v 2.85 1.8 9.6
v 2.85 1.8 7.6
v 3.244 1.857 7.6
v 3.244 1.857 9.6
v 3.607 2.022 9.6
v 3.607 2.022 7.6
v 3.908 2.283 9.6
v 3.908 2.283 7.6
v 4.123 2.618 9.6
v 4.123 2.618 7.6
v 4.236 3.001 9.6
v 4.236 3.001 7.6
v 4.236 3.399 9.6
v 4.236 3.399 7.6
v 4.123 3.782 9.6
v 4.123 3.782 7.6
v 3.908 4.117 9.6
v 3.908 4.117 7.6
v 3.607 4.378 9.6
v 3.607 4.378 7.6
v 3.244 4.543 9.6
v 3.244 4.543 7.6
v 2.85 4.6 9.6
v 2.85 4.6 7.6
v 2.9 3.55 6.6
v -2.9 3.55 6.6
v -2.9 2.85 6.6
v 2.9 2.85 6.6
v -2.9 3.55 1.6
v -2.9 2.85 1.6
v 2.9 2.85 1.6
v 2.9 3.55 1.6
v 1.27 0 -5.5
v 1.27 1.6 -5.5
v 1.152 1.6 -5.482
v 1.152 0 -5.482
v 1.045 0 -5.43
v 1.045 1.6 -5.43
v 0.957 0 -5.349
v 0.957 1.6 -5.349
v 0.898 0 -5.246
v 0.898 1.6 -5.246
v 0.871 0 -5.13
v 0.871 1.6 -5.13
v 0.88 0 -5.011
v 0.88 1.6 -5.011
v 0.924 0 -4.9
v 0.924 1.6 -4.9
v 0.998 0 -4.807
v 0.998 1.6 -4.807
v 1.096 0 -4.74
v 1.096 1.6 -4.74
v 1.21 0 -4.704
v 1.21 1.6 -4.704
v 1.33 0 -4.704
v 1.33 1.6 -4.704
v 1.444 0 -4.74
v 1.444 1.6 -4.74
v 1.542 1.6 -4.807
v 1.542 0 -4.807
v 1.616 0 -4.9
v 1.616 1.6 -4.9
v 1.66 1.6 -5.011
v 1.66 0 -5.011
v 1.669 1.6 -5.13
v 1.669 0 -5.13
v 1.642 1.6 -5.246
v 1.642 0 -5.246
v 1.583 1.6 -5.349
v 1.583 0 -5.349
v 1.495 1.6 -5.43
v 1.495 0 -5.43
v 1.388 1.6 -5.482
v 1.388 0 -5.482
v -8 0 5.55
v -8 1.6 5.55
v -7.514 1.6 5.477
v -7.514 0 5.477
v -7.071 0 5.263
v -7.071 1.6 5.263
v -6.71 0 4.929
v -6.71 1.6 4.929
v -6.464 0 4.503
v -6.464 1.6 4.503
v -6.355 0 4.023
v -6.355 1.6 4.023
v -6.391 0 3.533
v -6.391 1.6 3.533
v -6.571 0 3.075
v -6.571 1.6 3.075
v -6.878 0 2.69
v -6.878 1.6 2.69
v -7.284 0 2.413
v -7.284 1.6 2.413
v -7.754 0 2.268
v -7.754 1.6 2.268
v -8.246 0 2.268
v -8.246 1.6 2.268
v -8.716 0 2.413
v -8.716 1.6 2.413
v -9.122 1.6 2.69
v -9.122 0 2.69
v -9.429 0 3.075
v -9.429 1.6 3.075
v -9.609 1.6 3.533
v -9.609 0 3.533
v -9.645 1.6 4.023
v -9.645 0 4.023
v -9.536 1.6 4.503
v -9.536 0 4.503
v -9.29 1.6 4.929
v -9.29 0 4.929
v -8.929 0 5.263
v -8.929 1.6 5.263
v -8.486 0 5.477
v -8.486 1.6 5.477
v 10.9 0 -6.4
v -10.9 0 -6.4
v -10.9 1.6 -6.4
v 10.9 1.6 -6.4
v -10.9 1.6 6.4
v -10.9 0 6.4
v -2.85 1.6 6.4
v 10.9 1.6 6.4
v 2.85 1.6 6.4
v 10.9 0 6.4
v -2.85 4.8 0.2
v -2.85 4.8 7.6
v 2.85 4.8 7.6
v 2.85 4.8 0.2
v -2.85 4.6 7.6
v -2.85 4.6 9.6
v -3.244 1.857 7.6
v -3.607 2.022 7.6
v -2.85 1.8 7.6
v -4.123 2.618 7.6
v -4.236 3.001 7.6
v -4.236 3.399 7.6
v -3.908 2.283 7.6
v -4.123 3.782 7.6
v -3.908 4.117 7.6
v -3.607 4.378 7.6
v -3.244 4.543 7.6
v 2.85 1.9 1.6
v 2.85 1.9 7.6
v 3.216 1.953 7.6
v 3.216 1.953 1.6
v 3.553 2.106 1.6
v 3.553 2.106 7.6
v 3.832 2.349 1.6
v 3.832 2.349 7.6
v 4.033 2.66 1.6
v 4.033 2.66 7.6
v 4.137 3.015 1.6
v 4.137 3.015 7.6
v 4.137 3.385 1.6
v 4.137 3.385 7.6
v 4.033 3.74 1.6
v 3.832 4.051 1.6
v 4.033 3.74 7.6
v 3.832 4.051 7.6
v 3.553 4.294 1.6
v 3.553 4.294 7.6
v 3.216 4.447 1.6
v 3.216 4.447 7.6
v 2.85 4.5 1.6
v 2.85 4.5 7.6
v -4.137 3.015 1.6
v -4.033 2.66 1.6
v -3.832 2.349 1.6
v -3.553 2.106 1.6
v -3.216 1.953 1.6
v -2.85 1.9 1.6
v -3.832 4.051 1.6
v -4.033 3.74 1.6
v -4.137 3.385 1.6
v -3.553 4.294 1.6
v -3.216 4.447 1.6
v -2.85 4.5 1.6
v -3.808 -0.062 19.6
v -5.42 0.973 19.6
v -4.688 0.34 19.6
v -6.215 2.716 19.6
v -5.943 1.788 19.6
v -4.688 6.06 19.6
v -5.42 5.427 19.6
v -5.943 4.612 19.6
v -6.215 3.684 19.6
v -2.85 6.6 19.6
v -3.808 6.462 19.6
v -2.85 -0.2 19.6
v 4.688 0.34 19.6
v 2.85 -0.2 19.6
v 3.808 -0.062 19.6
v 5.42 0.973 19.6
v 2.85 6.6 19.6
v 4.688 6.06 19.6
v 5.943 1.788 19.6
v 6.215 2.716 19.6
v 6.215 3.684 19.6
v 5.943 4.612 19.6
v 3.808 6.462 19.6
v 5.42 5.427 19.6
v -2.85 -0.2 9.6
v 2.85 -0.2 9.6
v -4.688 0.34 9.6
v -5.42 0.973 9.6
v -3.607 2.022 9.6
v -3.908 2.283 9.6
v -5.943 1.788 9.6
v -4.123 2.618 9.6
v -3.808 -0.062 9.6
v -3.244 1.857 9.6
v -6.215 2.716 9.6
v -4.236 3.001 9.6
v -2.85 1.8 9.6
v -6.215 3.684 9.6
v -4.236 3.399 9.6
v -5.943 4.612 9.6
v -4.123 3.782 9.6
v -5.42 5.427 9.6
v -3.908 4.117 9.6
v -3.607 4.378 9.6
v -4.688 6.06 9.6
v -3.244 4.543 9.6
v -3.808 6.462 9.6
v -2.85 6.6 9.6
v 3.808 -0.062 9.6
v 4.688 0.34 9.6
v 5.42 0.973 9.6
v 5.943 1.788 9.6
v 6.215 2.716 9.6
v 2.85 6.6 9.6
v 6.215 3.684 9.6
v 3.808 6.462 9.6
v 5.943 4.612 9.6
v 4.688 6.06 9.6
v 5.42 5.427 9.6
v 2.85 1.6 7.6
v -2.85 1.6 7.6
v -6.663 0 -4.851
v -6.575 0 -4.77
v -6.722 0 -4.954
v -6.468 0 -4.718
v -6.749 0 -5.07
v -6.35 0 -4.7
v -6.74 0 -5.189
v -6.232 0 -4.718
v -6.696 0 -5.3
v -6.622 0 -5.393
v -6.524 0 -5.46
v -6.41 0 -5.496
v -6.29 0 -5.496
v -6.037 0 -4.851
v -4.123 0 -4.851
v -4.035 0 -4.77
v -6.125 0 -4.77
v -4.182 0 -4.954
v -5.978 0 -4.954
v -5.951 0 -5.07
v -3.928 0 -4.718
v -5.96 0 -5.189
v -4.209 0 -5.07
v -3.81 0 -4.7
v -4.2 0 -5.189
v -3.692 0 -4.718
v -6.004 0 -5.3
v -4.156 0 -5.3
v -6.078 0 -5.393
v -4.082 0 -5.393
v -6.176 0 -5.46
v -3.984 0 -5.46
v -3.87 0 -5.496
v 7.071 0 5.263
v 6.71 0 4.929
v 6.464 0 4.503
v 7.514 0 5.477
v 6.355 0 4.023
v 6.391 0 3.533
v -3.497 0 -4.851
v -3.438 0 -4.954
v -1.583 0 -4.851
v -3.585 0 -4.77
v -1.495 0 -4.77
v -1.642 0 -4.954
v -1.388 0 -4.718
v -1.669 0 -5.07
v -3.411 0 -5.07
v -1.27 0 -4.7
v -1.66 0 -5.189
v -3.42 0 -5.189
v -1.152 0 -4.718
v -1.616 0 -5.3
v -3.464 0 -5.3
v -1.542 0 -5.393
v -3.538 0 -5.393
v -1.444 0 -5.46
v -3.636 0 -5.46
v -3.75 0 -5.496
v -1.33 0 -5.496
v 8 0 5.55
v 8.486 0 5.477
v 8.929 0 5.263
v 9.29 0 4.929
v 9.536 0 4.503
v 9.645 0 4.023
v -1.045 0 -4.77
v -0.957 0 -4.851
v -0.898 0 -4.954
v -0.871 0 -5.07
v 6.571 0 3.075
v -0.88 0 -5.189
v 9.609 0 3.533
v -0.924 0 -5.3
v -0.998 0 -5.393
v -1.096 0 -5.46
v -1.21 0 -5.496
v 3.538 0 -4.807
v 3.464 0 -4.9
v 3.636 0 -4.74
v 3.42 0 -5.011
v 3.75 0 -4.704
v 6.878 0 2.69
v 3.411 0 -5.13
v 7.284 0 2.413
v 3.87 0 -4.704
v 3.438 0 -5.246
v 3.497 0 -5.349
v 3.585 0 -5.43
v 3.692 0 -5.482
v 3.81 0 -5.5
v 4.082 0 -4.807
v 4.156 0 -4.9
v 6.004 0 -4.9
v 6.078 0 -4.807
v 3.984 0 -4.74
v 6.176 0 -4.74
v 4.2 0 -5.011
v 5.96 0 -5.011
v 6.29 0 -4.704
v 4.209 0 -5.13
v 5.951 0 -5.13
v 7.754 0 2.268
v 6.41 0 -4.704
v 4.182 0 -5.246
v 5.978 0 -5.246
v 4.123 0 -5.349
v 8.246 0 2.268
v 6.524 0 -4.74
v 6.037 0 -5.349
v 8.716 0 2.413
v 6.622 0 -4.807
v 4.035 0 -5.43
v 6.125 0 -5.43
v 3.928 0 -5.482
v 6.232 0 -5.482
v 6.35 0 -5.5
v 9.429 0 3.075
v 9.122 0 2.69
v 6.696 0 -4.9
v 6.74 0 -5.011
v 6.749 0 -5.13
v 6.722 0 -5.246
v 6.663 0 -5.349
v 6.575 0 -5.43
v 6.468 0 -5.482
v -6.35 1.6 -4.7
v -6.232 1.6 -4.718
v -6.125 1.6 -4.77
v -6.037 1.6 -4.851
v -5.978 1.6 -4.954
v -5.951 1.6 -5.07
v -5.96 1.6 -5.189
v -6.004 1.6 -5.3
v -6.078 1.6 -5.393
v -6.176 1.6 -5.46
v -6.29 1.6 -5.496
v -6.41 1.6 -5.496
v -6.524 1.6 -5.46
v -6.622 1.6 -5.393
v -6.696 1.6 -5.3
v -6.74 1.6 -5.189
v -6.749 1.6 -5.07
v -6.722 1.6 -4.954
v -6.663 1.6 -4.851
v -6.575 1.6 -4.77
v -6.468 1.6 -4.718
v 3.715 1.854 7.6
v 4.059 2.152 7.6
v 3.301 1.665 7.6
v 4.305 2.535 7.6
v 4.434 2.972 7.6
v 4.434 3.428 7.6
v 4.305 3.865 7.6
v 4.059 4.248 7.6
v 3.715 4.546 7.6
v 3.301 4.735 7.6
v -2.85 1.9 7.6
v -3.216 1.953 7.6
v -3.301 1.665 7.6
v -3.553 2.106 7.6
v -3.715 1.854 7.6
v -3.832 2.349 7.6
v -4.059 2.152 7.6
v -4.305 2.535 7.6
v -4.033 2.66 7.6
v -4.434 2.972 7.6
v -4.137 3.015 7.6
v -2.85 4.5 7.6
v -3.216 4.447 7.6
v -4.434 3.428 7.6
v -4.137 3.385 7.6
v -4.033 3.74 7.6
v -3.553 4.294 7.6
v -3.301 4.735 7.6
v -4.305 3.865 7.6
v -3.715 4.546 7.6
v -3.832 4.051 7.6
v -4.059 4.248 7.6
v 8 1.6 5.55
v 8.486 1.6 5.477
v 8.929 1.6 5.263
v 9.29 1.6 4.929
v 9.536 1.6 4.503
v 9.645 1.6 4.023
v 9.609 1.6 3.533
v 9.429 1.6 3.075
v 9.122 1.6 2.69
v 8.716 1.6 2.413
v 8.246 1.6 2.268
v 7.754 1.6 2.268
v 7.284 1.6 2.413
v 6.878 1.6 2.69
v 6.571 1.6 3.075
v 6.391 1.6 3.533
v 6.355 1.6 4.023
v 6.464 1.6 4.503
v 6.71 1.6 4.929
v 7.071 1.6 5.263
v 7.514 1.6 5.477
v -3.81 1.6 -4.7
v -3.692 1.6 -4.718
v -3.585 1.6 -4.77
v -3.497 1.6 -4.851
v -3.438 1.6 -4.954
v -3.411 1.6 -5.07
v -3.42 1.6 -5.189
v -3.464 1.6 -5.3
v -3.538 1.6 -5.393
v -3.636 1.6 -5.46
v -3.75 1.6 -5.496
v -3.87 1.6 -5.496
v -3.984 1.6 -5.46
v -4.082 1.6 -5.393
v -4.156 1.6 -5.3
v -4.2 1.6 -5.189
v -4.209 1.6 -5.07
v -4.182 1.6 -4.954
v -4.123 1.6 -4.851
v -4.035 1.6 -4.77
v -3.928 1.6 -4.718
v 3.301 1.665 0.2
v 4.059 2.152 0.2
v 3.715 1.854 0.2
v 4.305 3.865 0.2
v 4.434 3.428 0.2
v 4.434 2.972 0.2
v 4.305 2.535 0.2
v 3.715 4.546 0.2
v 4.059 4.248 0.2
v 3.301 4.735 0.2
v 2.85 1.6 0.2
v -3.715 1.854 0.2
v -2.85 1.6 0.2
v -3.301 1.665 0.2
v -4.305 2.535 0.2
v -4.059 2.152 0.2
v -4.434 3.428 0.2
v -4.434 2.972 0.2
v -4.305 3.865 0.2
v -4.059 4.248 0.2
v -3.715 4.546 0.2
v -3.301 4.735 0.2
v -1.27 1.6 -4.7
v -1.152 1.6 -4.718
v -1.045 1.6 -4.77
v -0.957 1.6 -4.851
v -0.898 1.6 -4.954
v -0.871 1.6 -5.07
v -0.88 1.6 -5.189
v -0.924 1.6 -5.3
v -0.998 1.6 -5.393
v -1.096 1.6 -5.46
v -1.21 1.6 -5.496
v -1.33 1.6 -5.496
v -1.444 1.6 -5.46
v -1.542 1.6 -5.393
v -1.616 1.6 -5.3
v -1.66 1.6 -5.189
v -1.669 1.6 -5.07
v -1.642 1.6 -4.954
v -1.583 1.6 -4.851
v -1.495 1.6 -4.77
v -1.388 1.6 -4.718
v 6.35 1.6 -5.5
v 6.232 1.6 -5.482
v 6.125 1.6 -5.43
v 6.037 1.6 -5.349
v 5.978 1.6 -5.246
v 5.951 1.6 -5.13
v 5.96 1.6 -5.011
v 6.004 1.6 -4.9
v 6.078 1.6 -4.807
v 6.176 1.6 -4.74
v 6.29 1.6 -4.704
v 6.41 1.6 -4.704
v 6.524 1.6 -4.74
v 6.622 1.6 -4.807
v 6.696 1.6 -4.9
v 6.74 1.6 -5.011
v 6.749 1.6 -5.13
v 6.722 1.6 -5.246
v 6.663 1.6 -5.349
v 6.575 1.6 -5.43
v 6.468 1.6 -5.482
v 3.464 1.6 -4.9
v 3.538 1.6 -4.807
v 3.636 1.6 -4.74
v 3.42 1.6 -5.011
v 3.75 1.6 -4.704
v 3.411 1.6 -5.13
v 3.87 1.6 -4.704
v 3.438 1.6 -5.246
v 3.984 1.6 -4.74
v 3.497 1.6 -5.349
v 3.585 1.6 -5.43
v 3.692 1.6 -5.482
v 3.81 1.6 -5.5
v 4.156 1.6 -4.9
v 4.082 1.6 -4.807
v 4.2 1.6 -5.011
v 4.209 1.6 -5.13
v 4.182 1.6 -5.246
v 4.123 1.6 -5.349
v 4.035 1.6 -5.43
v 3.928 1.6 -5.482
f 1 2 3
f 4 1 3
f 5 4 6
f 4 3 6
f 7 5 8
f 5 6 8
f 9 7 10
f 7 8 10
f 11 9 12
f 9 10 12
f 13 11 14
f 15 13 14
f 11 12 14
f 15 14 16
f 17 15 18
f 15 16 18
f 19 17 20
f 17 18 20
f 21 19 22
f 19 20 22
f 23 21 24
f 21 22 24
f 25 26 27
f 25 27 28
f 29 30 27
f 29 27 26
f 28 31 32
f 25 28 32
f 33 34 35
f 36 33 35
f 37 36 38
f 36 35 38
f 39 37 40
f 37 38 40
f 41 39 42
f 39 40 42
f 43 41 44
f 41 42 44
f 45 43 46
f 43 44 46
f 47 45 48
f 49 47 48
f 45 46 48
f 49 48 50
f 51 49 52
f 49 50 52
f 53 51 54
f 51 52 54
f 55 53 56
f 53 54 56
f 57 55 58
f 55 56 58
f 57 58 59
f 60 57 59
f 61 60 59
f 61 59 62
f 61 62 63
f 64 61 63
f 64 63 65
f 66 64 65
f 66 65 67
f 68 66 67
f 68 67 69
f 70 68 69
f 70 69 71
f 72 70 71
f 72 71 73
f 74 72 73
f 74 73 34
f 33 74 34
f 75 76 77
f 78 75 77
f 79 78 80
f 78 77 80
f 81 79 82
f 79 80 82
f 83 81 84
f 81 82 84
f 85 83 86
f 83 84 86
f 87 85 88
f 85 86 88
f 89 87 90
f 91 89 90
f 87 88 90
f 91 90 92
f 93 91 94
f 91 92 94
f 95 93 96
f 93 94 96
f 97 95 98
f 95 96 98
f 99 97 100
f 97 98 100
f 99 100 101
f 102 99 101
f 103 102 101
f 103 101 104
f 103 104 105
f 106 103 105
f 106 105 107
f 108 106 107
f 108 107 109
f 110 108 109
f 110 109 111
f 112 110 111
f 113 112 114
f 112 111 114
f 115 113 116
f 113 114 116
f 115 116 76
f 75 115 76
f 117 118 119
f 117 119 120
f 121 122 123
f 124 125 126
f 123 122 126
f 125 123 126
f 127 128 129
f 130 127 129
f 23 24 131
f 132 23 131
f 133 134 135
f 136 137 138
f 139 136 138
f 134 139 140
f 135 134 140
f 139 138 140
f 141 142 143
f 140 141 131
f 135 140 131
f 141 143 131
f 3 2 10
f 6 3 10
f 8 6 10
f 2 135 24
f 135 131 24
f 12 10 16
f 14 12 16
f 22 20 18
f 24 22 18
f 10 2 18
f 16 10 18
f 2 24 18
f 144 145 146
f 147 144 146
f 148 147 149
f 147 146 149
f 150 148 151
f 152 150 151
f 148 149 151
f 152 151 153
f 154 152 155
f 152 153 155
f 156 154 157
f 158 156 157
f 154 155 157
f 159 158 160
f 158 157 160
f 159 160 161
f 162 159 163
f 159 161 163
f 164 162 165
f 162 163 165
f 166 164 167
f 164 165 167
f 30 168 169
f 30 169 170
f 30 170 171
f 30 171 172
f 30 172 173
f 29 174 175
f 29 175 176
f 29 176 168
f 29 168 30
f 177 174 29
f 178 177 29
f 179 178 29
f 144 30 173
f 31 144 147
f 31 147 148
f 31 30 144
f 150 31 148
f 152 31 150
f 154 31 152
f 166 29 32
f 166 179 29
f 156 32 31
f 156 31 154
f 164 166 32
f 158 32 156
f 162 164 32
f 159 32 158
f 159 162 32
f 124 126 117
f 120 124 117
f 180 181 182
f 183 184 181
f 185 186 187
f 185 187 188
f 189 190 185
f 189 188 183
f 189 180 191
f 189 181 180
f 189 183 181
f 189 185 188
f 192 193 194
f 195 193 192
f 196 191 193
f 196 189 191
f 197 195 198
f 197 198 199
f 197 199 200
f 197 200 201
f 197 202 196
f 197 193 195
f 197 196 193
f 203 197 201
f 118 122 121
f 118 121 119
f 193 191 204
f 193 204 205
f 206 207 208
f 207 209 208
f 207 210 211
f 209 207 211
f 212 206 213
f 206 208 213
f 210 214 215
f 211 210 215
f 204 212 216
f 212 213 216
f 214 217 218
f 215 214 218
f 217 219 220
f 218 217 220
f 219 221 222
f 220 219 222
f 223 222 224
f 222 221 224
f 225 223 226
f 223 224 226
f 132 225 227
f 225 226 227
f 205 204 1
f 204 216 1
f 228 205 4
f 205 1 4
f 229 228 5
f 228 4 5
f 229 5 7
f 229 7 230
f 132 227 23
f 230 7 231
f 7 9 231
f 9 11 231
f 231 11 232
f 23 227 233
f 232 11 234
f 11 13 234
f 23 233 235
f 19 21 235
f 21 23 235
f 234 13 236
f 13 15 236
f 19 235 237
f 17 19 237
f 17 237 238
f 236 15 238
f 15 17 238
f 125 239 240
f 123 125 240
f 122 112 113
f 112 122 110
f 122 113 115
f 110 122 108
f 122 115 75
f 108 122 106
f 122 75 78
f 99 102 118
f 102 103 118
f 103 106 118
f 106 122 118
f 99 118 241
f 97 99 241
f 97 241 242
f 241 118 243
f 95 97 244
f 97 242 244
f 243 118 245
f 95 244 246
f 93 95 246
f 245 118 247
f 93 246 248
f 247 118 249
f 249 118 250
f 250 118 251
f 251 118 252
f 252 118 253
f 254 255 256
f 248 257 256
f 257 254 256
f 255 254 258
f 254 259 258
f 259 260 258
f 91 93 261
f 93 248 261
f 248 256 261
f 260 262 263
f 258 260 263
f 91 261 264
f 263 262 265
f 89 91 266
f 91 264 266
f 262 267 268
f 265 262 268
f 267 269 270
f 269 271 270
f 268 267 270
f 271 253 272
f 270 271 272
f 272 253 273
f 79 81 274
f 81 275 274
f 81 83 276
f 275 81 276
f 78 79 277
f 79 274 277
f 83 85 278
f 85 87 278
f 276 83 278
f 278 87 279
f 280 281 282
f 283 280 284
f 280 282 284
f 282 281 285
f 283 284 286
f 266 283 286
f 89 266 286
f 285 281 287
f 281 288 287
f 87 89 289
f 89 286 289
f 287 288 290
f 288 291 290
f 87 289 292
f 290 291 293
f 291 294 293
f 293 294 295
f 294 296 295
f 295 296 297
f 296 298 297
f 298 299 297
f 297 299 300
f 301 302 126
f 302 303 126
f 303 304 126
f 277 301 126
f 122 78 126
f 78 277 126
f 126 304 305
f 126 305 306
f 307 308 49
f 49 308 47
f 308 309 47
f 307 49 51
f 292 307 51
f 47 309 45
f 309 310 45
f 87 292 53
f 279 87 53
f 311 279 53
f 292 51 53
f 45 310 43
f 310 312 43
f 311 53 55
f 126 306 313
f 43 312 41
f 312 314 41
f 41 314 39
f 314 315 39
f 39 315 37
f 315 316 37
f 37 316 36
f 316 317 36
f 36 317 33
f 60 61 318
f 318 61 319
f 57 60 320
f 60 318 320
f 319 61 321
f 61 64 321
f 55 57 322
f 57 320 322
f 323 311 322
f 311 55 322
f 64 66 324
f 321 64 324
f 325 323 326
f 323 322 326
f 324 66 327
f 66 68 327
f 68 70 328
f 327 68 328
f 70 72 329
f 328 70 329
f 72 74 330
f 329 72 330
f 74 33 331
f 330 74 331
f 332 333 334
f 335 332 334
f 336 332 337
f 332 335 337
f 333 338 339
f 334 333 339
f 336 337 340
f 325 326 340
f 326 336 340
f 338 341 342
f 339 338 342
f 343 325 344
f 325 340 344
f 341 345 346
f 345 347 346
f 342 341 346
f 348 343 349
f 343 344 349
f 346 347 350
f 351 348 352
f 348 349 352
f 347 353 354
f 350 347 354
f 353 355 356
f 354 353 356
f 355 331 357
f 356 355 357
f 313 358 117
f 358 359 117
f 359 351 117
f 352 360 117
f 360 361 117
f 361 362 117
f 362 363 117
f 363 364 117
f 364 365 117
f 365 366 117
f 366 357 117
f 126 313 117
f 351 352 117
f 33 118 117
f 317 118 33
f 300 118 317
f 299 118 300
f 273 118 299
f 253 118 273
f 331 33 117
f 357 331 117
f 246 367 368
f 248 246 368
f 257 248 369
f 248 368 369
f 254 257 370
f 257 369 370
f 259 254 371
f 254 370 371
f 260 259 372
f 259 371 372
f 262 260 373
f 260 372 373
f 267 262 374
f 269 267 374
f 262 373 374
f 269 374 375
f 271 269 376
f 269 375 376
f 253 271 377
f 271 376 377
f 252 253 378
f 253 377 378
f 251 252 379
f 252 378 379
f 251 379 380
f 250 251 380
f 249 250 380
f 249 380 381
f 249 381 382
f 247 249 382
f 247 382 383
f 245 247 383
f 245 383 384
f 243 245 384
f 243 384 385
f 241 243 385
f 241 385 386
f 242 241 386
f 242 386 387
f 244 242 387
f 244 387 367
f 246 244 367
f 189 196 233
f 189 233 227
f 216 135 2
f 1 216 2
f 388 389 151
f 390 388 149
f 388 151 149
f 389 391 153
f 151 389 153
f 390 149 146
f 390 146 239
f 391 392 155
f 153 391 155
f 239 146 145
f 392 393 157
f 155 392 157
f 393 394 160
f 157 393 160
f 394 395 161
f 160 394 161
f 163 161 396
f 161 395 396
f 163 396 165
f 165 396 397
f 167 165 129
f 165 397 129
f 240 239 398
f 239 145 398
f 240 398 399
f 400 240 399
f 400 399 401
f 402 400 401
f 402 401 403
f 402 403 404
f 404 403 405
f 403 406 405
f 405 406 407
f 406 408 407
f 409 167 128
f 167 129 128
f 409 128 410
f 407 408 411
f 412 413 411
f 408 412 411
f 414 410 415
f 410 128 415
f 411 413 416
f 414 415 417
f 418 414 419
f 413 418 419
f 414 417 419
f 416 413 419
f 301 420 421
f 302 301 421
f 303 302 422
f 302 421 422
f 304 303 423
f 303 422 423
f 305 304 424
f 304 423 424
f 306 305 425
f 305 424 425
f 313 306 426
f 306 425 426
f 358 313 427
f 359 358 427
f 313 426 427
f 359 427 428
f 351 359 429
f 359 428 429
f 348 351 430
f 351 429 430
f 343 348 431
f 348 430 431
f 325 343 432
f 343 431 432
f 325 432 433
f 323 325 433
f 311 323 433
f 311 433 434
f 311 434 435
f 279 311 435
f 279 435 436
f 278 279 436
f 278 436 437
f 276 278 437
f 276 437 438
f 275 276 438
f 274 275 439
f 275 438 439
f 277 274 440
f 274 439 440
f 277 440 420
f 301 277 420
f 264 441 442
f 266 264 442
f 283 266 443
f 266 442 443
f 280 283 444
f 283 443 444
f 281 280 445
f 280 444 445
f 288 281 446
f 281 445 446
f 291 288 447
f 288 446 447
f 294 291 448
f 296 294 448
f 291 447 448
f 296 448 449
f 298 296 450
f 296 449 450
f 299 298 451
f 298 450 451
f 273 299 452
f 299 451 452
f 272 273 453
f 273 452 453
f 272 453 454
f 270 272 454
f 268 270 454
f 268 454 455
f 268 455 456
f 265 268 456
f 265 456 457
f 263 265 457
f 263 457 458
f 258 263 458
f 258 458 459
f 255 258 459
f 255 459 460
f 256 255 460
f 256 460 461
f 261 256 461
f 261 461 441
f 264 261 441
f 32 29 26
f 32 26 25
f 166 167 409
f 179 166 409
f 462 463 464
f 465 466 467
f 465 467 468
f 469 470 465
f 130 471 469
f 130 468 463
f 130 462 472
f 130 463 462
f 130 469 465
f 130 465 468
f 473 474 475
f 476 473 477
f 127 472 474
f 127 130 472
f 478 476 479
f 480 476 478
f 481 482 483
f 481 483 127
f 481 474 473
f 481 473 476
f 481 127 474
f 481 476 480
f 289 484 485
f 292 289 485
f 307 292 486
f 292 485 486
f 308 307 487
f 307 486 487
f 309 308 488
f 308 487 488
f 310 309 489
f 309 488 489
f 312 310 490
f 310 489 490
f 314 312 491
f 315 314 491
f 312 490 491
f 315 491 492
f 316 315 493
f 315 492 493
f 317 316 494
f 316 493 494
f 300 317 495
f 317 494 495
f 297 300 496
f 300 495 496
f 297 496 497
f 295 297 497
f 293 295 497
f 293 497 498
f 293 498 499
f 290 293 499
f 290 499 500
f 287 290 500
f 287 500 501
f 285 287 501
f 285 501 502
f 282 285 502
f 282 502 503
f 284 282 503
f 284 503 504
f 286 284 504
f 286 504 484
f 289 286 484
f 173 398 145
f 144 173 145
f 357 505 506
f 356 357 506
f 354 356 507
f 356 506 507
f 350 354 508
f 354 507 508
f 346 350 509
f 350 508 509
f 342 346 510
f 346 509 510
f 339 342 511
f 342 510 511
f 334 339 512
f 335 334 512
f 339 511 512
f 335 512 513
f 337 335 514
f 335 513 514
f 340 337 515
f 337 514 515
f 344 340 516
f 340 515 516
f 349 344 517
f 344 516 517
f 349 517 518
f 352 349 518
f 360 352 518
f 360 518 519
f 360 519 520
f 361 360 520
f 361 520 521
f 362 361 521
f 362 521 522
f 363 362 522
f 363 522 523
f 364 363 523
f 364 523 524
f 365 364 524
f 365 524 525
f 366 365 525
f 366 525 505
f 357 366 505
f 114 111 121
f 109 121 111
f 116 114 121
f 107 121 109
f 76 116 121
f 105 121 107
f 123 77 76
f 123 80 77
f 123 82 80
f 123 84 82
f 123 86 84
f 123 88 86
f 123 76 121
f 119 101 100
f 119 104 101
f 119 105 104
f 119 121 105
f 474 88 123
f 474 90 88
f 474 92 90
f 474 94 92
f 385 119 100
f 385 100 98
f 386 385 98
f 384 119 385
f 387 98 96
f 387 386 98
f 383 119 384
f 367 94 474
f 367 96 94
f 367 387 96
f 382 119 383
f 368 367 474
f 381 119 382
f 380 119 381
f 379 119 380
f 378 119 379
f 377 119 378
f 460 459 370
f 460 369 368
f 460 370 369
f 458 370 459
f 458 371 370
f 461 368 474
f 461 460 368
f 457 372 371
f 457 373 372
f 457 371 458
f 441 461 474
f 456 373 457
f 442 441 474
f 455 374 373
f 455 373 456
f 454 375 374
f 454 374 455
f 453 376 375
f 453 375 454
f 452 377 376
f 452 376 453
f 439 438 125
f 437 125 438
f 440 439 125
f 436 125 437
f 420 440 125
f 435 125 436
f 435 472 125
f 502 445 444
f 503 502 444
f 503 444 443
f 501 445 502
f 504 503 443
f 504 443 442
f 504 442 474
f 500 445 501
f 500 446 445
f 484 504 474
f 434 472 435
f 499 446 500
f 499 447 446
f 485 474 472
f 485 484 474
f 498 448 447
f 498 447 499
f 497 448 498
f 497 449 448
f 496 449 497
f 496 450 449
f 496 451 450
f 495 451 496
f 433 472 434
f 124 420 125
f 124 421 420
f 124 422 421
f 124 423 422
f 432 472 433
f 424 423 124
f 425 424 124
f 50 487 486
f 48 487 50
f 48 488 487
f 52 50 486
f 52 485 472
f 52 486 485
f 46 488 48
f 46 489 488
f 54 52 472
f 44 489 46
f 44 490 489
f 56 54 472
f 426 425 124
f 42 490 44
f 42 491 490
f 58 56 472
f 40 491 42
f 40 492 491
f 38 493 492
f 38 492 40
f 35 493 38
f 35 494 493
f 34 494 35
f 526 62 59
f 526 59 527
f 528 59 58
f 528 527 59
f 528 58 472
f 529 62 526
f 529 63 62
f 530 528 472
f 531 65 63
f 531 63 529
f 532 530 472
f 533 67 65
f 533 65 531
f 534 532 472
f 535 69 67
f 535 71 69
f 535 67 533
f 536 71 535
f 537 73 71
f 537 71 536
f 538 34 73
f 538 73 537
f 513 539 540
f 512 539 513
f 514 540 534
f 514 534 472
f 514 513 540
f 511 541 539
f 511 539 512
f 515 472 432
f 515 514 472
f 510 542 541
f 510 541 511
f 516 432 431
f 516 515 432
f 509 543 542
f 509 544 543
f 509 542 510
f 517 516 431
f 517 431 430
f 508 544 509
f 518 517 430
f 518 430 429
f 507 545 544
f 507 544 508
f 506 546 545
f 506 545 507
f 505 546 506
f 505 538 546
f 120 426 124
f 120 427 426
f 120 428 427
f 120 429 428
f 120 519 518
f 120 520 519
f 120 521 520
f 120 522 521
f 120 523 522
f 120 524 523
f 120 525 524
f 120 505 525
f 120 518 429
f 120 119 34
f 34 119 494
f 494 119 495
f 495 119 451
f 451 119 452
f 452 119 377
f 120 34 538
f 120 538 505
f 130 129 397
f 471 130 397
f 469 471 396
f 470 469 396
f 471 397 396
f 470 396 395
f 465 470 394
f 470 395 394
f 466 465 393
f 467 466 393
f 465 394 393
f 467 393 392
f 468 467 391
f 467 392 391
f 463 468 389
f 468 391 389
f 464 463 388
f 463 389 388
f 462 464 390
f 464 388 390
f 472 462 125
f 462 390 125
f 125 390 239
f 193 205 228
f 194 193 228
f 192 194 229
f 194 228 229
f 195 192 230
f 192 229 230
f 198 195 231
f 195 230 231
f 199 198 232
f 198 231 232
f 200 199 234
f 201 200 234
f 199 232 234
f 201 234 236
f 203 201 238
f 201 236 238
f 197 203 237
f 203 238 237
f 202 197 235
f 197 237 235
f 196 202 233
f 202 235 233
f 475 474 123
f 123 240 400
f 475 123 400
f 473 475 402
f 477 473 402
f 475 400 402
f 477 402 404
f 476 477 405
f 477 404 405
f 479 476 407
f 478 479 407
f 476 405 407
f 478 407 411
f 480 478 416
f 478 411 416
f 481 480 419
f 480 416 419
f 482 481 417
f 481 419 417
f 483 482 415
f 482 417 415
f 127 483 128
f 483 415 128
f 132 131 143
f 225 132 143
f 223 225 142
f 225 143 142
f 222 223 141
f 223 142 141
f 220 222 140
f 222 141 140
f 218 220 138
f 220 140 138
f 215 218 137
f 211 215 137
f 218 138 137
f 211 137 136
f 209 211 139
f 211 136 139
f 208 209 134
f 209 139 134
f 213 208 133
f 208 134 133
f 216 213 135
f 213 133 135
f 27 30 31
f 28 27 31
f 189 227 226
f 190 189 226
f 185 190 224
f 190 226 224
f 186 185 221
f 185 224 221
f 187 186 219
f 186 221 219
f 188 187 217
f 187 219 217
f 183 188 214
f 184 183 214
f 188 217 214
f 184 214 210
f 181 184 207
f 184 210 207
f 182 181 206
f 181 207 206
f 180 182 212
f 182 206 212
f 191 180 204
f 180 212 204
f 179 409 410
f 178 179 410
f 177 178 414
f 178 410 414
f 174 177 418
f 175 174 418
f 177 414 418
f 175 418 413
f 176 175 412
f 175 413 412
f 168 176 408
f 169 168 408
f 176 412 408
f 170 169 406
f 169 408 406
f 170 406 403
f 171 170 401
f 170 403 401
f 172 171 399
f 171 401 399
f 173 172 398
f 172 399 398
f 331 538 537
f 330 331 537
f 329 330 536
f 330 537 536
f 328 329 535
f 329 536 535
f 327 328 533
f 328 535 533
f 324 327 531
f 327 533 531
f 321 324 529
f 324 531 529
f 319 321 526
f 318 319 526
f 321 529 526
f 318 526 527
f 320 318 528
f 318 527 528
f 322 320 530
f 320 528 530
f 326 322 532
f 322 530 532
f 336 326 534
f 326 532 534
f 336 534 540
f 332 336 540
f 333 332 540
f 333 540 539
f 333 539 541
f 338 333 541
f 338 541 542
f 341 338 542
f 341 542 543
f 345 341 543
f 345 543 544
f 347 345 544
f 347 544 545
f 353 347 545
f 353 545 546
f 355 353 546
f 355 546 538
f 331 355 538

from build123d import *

# Parameters (mm, degrees)
SKETCH1_W           = 21.8
SKETCH1_H           = 12.8
BOSS_EXTRUDE1_DEPTH = 1.6
SKETCH2_R           = 1.65
CUT_EXTRUDE1_DEPTH  = 1.6
BOSS_EXTRUDE2_DEPTH = 7.4
BOSS_EXTRUDE3_DEPTH = 2
BOSS_EXTRUDE4_DEPTH = 10
CUT_EXTRUDE2_DEPTH  = 6
SKETCH7_W           = 5.8
SKETCH7_H           = 0.7
BOSS_EXTRUDE5_DEPTH = 5
SKETCH8_R           = 0.4
CUT_EXTRUDE3_DEPTH  = 23.977597786


# Read off the part's stored shape, not the designer's step: Split1
with BuildPart() as part:
    # Sketch1 → Boss-Extrude1 (new body)
    with BuildSketch(Plane(origin=(0, 0, 0), x_dir=(1, 0, 0), z_dir=(0, 1, 0))):
        Rectangle(SKETCH1_W, SKETCH1_H)
    extrude(amount=BOSS_EXTRUDE1_DEPTH)

    # Sketch2 → Cut-Extrude1 (cut)
    with BuildSketch(Plane(origin=(0, 1.6, 0), x_dir=(1, 0, 0), z_dir=(0, 1, 0))):
        with Locations(Location((-8, -3.9, 0), (0, 0, 270))):
            Circle(SKETCH2_R)
        with Locations(Location((8, -3.9, 0), (0, 0, 270))):
            Circle(SKETCH2_R)
    extrude(amount=-CUT_EXTRUDE1_DEPTH, mode=Mode.SUBTRACT)

    # Sketch3 → Boss-Extrude2 (add)
    with BuildSketch(Plane.XY.offset(7.6)):
        with BuildLine():
            Line((-2.85, 4.8), (2.85, 4.8))
            ThreePointArc((2.85, 4.8), (4.45, 3.2), (2.85, 1.6))
            Line((2.85, 1.6), (-2.85, 1.6))
            ThreePointArc((-2.85, 1.6), (-4.45, 3.2), (-2.85, 4.8))
        make_face()
    extrude(amount=-BOSS_EXTRUDE2_DEPTH)

    # Sketch4 → Boss-Extrude3 (add)
    with BuildSketch(Plane.XY.offset(7.6)):
        with BuildLine():
            Line((-2.85, 1.8), (2.85, 1.8))
            ThreePointArc((2.85, 1.8), (4.25, 3.2), (2.85, 4.6))
            Line((2.85, 4.6), (-2.85, 4.6))
            ThreePointArc((-2.85, 4.6), (-4.25, 3.2), (-2.85, 1.8))
        make_face()
    extrude(amount=BOSS_EXTRUDE3_DEPTH)

    # Sketch5 → Boss-Extrude4 (add)
    with BuildSketch(Plane.XY.offset(9.6)):
        with BuildLine():
            Line((-2.85, -0.2), (2.85, -0.2))
            ThreePointArc((2.85, -0.2), (6.25, 3.2), (2.85, 6.6))
            Line((2.85, 6.6), (-2.85, 6.6))
            ThreePointArc((-2.85, 6.6), (-6.25, 3.2), (-2.85, -0.2))
        make_face()
    extrude(amount=BOSS_EXTRUDE4_DEPTH)


with BuildPart() as body_2:
    # Split1: the piece on the far side of the plane
    add(part.part)
    split(bisect_by=Plane.XY.offset(7.6), keep=Keep.BOTTOM)

    # Sketch6 → Cut-Extrude2 (cut)
    with BuildSketch(Plane.XY.offset(7.6)):
        with BuildLine():
            Line((-2.85, 1.9), (2.85, 1.9))
            ThreePointArc((2.85, 1.9), (4.15, 3.2), (2.85, 4.5))
            Line((2.85, 4.5), (-2.85, 4.5))
            ThreePointArc((-2.85, 4.5), (-4.15, 3.2), (-2.85, 1.9))
        make_face()
    extrude(amount=-CUT_EXTRUDE2_DEPTH, mode=Mode.SUBTRACT)

    # Sketch7 → Boss-Extrude5 (add)
    with BuildSketch(Plane.XY.offset(1.6)):
        with Locations((0, 3.2)):
            Rectangle(SKETCH7_W, SKETCH7_H)
    extrude(amount=BOSS_EXTRUDE5_DEPTH)

    # Sketch8 → Cut-Extrude3 (cut, through all)
    with BuildSketch(Plane(origin=(0, 1.6, 0), x_dir=(1, 0, 0), z_dir=(0, 1, 0))):
        with Locations(Location((-1.27, 5.1, 0), (0, 0, 270))):
            Circle(SKETCH8_R)
        with Locations(Location((-3.81, 5.1, 0), (0, 0, 270))):
            Circle(SKETCH8_R)
        with Locations(Location((-6.35, 5.1, 0), (0, 0, 270))):
            Circle(SKETCH8_R)
        with Locations(Location((1.27, 5.1, 0), (0, 0, 90))):
            Circle(SKETCH8_R)
        with Locations(Location((3.81, 5.1, 0), (0, 0, 90))):
            Circle(SKETCH8_R)
        with Locations(Location((6.35, 5.1, 0), (0, 0, 90))):
            Circle(SKETCH8_R)
    extrude(amount=-CUT_EXTRUDE3_DEPTH, mode=Mode.SUBTRACT)


with BuildPart() as part_1:
    add(part.part)

    # Split1
    split(bisect_by=Plane.XY.offset(7.6), keep=Keep.TOP)


solid = Compound([body_2.part, part_1.part])
